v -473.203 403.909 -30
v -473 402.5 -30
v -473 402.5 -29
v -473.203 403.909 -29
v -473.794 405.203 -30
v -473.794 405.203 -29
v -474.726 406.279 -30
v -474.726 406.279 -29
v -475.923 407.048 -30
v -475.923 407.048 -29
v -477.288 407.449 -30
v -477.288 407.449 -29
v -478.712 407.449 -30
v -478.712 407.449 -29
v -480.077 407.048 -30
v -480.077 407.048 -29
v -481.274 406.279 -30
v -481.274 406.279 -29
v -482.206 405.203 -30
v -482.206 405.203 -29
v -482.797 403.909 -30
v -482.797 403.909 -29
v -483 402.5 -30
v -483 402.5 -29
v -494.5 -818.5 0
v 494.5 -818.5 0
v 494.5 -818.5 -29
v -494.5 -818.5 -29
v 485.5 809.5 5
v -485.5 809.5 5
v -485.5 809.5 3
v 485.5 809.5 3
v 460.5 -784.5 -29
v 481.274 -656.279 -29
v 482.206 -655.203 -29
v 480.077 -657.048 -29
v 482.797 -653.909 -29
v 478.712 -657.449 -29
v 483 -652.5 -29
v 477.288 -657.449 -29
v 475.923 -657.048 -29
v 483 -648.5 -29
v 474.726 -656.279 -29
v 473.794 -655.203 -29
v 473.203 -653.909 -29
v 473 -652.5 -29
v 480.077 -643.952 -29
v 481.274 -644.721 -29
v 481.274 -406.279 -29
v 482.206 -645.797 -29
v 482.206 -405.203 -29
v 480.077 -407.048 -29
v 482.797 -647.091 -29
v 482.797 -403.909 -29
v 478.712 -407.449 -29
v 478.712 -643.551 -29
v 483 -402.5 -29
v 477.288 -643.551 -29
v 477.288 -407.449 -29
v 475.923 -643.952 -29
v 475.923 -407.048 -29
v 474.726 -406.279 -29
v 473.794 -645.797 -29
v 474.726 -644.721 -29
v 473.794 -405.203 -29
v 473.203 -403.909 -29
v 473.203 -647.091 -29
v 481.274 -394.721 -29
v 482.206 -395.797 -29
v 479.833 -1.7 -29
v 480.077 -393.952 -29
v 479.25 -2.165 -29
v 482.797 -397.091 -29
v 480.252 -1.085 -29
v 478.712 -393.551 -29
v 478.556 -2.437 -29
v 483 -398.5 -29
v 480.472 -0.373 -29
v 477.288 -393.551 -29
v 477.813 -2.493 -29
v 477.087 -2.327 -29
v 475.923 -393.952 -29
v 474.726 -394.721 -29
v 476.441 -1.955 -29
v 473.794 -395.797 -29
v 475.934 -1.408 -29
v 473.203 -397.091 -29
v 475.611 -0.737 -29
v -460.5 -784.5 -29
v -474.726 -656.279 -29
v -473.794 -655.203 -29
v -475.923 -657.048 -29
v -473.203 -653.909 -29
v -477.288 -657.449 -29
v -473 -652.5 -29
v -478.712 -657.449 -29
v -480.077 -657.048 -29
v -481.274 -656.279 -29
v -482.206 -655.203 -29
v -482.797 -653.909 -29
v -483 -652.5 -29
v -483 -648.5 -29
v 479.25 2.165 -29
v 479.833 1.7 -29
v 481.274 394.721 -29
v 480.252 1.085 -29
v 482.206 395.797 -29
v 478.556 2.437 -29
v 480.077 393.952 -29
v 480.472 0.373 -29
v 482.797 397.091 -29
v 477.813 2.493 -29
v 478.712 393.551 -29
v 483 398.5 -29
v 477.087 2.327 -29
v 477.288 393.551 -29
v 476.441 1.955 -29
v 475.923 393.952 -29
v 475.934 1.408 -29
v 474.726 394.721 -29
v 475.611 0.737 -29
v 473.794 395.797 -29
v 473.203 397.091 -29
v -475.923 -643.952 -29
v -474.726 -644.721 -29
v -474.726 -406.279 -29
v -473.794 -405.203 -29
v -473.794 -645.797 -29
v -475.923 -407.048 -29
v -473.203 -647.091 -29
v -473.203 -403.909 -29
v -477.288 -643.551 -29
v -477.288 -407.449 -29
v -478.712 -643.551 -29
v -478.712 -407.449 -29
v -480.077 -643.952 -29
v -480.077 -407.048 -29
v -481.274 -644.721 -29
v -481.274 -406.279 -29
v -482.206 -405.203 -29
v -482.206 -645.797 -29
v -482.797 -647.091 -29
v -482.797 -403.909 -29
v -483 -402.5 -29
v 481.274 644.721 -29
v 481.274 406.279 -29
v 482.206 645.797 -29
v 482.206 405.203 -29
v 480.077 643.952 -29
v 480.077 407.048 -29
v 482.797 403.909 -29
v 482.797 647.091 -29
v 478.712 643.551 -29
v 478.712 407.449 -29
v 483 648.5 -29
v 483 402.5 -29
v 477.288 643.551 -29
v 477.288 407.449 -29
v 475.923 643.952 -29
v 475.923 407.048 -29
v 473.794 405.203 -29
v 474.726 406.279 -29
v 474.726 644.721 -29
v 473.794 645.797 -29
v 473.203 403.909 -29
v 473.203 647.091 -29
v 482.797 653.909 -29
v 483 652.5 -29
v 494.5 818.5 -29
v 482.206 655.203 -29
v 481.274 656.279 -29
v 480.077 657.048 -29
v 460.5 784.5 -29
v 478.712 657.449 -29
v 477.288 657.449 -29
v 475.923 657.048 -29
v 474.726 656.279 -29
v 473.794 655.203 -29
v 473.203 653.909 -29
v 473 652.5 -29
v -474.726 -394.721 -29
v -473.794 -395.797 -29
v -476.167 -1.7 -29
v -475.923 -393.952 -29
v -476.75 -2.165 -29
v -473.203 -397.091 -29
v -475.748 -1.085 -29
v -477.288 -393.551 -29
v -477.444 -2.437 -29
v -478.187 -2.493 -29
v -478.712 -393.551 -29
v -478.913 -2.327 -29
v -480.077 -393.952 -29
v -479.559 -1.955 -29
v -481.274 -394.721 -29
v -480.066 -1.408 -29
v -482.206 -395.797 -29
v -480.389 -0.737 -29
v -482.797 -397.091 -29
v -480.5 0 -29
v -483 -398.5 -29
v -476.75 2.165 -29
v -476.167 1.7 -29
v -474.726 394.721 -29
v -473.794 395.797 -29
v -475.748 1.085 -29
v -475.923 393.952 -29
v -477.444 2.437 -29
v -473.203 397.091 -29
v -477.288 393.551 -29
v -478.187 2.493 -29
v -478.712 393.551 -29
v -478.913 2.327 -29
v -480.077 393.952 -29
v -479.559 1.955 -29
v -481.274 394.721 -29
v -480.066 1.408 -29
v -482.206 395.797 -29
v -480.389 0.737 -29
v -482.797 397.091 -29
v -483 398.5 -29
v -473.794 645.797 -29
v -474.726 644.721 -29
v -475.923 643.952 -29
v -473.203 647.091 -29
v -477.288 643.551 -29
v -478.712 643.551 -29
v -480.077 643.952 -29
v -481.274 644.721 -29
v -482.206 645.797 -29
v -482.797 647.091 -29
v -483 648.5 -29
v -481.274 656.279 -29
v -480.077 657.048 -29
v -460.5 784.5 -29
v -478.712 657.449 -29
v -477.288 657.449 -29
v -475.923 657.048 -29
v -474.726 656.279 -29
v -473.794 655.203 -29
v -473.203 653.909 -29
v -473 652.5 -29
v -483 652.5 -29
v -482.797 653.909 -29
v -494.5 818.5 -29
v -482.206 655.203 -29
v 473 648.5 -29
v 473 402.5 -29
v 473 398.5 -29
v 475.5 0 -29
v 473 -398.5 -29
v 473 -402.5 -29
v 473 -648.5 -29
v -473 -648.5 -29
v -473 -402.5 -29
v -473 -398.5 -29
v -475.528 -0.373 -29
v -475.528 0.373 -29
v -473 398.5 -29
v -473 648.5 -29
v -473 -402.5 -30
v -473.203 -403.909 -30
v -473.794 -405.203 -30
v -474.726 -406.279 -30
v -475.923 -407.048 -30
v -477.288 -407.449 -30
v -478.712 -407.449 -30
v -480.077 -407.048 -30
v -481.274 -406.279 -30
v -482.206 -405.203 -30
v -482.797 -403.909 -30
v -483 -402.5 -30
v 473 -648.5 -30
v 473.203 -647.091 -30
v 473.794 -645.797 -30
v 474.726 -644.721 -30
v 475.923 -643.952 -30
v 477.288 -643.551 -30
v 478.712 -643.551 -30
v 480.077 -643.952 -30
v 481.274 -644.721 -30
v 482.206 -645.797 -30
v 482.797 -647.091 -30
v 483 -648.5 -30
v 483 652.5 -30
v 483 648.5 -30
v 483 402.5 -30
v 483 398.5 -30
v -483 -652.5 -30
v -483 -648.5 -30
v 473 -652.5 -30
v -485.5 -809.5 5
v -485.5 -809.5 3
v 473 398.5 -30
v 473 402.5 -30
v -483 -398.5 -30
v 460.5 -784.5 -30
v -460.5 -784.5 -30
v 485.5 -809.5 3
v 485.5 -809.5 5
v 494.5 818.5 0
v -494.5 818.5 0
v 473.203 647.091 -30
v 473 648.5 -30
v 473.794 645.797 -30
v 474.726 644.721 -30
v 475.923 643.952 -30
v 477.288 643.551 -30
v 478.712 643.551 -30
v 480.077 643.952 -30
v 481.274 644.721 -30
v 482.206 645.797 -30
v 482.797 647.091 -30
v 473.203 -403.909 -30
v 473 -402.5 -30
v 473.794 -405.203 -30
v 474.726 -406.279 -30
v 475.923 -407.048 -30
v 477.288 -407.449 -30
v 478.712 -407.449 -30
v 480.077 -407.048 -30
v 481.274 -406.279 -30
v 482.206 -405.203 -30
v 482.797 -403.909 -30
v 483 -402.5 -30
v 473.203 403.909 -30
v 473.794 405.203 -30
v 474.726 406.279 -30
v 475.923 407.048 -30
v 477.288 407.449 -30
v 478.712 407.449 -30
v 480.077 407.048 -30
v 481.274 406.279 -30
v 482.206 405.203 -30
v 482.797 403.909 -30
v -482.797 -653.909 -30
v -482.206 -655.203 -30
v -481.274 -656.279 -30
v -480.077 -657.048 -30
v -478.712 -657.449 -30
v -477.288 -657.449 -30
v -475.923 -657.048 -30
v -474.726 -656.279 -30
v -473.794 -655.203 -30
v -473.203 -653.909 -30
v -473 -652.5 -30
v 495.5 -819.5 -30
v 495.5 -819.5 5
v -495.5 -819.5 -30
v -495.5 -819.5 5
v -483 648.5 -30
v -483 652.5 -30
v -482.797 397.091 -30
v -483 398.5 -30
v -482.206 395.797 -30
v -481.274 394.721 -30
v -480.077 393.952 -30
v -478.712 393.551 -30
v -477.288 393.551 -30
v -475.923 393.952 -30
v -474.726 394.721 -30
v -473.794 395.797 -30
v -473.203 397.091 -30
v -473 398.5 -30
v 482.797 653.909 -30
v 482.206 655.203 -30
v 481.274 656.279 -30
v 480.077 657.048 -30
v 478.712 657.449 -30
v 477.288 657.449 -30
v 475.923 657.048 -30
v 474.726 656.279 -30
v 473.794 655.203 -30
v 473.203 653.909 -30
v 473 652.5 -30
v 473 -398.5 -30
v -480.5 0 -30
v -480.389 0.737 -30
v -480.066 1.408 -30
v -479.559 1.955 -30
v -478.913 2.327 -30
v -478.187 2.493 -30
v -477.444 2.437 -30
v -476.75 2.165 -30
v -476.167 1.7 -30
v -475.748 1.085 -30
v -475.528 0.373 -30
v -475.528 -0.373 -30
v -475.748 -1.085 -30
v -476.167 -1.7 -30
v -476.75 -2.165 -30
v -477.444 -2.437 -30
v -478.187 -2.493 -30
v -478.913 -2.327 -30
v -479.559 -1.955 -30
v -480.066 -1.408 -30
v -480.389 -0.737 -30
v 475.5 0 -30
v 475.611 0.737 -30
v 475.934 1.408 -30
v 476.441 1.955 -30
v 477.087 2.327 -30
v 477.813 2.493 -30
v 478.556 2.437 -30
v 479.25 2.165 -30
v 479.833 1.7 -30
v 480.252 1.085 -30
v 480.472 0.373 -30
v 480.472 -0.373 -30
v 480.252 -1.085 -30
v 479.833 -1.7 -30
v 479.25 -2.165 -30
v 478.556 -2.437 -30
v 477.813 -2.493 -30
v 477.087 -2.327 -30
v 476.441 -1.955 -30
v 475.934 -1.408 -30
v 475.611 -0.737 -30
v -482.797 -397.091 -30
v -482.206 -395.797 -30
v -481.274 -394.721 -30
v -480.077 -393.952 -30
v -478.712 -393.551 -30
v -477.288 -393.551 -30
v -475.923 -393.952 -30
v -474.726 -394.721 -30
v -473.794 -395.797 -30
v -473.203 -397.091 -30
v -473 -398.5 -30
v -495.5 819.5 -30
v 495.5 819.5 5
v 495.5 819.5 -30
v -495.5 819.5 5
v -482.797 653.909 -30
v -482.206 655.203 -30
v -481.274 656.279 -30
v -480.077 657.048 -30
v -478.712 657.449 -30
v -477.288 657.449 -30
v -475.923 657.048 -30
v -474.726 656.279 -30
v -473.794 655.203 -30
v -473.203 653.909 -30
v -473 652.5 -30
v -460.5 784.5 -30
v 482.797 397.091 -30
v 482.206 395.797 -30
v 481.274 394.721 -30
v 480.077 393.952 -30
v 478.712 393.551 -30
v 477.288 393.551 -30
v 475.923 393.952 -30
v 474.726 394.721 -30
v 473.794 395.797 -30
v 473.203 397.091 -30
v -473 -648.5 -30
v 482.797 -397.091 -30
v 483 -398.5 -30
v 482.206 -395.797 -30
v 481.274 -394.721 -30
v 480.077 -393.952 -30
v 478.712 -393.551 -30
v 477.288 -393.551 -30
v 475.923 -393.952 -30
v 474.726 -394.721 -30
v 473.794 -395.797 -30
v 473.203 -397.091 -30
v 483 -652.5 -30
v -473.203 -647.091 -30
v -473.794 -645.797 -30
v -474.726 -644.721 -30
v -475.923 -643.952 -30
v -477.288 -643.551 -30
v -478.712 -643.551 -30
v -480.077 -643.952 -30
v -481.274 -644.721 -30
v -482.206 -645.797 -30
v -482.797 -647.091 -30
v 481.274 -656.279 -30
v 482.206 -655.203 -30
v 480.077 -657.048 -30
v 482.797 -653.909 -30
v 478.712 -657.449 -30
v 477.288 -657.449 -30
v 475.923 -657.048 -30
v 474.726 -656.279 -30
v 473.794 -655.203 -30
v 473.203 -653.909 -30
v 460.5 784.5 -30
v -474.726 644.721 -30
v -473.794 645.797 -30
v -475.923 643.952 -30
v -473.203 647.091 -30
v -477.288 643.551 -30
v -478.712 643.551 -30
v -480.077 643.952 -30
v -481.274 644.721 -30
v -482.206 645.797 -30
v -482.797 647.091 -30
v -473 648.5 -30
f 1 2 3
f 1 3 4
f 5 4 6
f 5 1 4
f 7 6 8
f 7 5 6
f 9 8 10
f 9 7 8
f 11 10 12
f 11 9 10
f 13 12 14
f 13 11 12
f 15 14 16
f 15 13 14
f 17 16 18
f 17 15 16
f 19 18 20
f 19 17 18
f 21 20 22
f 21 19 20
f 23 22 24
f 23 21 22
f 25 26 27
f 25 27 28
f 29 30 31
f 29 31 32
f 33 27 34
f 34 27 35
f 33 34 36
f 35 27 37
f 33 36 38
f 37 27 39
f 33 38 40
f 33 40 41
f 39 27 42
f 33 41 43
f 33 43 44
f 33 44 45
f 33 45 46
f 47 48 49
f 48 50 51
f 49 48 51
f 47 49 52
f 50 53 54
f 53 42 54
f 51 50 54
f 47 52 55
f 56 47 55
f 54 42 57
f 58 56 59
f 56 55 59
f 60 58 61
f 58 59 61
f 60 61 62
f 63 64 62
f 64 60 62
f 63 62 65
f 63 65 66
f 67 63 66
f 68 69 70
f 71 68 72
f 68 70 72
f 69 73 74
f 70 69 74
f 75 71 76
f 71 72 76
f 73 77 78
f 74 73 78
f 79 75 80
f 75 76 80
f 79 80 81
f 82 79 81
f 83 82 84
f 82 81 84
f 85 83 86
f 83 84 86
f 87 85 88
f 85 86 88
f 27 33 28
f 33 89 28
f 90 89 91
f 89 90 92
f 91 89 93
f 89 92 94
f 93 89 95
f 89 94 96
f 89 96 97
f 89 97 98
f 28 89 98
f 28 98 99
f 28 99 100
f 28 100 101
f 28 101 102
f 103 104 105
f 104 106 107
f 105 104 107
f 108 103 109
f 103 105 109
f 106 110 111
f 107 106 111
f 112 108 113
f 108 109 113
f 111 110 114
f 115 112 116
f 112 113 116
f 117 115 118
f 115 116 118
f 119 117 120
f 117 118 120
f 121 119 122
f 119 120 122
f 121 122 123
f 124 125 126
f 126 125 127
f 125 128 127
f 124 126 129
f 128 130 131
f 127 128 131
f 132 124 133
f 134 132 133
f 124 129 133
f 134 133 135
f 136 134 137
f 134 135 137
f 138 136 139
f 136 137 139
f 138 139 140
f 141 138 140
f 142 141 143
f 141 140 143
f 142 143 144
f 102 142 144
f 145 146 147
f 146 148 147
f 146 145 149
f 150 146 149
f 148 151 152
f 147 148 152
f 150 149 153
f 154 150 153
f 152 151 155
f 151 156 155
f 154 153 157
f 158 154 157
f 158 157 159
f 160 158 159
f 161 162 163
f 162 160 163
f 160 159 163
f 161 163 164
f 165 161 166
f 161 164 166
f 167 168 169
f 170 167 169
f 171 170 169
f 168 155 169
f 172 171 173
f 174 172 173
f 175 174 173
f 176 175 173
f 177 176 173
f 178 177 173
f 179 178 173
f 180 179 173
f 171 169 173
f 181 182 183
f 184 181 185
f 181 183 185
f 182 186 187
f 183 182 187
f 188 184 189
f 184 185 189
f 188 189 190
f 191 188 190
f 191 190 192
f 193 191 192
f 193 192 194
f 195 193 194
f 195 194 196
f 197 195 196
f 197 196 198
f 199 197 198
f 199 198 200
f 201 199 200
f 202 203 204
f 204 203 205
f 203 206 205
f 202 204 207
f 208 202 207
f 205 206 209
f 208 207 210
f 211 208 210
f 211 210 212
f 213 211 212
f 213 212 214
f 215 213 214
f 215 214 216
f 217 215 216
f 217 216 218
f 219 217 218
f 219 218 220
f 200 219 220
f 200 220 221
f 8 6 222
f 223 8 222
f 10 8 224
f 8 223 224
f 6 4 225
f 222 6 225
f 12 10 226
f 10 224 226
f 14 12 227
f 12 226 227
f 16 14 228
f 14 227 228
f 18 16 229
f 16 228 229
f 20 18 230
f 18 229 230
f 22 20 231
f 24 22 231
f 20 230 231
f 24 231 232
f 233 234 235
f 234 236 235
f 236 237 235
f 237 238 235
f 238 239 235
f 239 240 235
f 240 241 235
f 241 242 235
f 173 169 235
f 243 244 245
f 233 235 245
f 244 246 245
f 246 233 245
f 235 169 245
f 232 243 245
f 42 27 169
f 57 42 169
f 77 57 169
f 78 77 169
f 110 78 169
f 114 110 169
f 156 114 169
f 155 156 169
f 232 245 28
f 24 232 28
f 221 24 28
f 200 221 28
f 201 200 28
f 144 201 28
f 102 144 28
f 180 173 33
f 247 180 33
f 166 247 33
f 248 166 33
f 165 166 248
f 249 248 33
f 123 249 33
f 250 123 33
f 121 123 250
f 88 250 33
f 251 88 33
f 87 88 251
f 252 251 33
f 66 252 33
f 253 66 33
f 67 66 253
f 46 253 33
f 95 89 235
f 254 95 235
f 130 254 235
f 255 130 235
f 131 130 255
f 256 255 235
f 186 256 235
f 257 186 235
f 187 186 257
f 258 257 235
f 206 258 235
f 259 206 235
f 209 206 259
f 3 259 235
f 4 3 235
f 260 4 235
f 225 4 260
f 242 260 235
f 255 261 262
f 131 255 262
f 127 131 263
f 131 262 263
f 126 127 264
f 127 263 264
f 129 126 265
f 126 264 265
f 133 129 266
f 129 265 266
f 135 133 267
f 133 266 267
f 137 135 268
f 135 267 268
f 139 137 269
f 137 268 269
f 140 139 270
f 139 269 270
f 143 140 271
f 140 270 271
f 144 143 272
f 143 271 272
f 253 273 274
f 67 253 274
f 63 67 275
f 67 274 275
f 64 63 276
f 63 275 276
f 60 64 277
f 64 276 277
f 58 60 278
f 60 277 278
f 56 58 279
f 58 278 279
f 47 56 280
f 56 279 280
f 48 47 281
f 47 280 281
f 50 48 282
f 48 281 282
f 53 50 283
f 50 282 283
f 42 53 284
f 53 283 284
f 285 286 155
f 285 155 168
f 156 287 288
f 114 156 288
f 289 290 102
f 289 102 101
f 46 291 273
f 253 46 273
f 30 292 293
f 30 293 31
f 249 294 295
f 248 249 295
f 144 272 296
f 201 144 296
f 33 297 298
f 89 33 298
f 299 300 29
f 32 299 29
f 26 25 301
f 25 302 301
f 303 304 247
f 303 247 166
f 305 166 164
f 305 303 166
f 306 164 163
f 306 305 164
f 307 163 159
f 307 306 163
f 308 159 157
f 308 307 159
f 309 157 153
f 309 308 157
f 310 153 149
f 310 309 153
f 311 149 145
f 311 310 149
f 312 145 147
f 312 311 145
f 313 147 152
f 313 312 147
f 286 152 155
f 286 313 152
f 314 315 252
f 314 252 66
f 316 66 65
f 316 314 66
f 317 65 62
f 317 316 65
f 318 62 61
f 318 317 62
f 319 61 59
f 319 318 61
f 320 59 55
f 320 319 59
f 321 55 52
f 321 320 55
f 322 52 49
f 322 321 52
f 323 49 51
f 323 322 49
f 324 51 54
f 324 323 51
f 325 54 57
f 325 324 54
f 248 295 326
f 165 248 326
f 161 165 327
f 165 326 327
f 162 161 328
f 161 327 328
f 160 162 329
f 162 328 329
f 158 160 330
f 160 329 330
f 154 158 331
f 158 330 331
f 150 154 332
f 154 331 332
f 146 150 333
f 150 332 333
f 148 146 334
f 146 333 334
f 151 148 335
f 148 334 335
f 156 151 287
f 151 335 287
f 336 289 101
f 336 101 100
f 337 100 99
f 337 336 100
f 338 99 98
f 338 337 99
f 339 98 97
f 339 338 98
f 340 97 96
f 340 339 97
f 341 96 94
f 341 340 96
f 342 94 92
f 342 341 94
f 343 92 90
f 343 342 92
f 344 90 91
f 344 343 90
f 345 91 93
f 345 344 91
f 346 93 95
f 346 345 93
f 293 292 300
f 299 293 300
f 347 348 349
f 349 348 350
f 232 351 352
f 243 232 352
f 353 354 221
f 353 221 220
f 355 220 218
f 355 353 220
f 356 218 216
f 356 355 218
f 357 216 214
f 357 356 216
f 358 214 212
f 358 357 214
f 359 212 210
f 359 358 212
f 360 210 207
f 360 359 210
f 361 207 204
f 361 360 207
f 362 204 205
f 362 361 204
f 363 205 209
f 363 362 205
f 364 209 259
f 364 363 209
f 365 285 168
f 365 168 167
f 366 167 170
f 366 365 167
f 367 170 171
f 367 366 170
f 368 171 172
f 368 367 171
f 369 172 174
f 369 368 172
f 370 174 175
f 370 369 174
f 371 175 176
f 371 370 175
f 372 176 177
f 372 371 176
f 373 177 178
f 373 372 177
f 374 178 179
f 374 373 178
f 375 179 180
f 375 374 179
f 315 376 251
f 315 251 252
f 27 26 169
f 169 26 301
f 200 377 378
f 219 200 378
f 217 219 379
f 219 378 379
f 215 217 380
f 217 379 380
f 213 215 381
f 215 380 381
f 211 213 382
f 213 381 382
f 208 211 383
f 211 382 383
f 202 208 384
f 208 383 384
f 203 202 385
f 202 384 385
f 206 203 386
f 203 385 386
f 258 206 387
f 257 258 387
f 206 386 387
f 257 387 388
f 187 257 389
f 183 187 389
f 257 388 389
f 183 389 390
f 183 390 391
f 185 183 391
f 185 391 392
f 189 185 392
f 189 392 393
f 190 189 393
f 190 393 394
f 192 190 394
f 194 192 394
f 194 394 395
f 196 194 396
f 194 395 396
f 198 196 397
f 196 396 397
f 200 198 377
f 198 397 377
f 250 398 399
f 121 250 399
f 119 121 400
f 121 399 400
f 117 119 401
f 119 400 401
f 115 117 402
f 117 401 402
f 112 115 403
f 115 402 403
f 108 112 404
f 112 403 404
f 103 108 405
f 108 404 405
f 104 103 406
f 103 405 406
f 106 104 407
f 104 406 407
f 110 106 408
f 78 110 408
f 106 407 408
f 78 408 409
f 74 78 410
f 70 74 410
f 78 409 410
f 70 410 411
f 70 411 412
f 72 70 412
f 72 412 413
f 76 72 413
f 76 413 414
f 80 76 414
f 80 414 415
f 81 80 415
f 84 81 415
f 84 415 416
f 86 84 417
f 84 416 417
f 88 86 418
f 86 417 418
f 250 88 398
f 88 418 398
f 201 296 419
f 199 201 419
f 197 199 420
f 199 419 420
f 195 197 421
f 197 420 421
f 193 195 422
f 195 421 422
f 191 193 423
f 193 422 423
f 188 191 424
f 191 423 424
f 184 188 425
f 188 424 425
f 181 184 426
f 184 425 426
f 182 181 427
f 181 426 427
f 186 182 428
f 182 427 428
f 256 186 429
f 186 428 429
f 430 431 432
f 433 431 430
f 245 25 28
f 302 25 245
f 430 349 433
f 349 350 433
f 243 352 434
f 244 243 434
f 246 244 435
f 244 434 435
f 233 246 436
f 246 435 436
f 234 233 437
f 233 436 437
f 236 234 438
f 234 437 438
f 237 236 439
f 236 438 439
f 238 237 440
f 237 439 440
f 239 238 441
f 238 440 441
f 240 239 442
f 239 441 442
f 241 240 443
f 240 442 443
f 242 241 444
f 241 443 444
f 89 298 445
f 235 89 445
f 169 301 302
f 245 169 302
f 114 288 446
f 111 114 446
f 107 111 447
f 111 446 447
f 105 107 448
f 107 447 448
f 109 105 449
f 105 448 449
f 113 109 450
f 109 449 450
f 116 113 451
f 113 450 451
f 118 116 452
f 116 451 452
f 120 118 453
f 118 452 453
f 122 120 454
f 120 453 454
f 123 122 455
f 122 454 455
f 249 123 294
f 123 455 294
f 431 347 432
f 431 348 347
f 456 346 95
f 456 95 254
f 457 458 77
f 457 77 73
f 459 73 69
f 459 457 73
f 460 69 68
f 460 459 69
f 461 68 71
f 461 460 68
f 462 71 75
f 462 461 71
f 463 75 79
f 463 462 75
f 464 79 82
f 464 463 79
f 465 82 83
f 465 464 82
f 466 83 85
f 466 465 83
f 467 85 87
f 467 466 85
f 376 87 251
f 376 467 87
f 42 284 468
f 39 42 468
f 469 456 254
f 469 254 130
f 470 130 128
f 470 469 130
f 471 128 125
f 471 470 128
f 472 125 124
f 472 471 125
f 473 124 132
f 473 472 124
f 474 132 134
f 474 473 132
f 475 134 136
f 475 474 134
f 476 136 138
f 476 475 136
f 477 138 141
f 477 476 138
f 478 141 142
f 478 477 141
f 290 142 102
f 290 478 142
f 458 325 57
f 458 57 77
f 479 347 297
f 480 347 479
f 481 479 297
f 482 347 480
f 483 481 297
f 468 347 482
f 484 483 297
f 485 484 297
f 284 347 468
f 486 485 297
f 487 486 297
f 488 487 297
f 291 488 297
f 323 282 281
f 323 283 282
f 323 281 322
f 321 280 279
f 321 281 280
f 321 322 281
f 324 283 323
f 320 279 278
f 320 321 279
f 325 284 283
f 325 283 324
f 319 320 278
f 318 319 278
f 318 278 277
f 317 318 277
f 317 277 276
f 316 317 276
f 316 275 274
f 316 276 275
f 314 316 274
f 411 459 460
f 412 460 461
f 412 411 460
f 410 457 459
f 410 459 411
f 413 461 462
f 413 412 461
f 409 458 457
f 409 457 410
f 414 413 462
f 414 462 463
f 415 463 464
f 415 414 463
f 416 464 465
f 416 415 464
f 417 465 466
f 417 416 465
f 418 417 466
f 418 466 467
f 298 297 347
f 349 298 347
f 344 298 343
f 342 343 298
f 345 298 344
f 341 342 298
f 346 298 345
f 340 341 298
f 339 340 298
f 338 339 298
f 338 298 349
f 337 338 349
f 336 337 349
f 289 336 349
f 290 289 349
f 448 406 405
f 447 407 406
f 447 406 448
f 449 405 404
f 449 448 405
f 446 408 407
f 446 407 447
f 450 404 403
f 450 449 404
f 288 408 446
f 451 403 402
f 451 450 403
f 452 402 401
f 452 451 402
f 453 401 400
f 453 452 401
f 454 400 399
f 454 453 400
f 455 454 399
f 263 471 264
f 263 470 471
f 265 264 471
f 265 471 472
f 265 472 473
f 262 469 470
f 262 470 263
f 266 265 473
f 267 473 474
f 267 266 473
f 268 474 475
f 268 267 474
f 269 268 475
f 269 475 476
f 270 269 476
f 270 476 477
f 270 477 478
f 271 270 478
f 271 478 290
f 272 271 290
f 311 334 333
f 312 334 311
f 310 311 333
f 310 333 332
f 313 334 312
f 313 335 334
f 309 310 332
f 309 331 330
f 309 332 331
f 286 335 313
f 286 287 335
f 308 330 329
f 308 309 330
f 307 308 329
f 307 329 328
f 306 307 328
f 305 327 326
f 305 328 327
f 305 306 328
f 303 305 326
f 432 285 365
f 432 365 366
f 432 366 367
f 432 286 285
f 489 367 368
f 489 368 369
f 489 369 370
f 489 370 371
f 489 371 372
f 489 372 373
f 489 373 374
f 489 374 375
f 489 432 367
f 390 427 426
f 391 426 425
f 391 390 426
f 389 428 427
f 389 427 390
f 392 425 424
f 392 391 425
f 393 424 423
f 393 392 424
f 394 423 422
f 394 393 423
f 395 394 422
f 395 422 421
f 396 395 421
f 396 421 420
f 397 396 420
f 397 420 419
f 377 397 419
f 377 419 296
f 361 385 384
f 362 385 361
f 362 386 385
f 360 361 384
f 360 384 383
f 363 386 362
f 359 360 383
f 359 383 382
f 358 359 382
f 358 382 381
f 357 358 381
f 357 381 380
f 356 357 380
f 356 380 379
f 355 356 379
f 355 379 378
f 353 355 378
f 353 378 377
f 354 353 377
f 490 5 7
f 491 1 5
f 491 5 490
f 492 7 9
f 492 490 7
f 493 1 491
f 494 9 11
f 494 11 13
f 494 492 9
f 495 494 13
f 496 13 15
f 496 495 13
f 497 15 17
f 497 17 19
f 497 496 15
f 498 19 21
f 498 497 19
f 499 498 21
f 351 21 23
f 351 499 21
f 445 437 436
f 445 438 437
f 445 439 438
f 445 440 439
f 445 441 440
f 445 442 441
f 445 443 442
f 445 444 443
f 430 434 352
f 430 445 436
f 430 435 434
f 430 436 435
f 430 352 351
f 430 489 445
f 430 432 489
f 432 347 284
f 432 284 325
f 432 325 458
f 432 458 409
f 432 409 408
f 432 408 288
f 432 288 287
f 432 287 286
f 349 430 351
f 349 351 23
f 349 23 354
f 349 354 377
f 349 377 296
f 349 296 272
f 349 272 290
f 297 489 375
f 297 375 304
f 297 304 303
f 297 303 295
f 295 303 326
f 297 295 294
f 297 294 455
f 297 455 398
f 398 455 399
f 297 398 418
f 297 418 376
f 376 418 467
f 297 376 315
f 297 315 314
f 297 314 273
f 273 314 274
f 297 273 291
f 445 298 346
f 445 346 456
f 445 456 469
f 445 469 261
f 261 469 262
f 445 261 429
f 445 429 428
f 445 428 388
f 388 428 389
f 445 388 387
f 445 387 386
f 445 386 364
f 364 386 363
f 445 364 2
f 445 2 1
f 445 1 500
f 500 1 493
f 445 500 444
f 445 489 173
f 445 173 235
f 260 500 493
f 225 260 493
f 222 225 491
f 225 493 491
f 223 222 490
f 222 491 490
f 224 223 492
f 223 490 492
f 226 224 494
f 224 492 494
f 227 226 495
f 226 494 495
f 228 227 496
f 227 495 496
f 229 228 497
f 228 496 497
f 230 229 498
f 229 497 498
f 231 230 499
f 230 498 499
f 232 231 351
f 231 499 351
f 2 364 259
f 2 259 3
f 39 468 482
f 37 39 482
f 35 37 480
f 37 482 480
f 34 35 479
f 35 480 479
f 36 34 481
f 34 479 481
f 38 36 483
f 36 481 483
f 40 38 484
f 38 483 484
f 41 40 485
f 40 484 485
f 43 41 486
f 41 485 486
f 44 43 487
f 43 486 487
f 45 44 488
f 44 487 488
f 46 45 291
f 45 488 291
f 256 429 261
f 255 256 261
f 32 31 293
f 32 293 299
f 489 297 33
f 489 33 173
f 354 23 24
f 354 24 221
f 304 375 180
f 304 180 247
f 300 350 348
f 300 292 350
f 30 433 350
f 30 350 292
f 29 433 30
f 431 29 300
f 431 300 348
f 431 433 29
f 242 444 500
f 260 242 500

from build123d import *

# Parameters (mm, degrees)
CROQUIS1_W              = 991
CROQUIS1_H              = 1639
SALIENTE_EXTRUIR1_DEPTH = 5
CROQUIS2_W              = 971
CROQUIS2_H              = 1619
CORTAR_EXTRUIR1_DEPTH   = 2
CROQUIS3_W              = 991
CROQUIS3_H              = 1639
CROQUIS3_W_2            = 989
CROQUIS3_H_2            = 1637
SALIENTE_EXTRUIR2_DEPTH = 30
CROQUIS4_W              = 991
CROQUIS4_H              = 1639
CROQUIS4_W_2            = 921
CROQUIS4_H_2            = 1569
SALIENTE_EXTRUIR3_DEPTH = 1
CROQUIS5_R              = 2.5
CORTAR_EXTRUIR2_DEPTH   = 1


with BuildPart() as part:
    # Croquis1 → Saliente-Extruir1 (new body)
    with BuildSketch(Plane.XY):
        Rectangle(CROQUIS1_W, CROQUIS1_H)
    extrude(amount=SALIENTE_EXTRUIR1_DEPTH)

    # Croquis2 → Cortar-Extruir1 (cut)
    with BuildSketch(Plane.XY.offset(5)):
        Rectangle(CROQUIS2_W, CROQUIS2_H)
    extrude(amount=-CORTAR_EXTRUIR1_DEPTH, mode=Mode.SUBTRACT)

    # Croquis3 → Saliente-Extruir2 (add)
    with BuildSketch(Plane(origin=(0, 0, 0), x_dir=(-1, 0, 0), z_dir=(0, 0, -1))):
        Rectangle(CROQUIS3_W, CROQUIS3_H)
        Rectangle(CROQUIS3_W_2, CROQUIS3_H_2, mode=Mode.SUBTRACT)
    extrude(amount=SALIENTE_EXTRUIR2_DEPTH)

    # Croquis4 → Saliente-Extruir3 (add)
    with BuildSketch(Plane(origin=(0, 0, -30), x_dir=(-1, 0, 0), z_dir=(0, 0, -1))):
        Rectangle(CROQUIS4_W, CROQUIS4_H)
        Rectangle(CROQUIS4_W_2, CROQUIS4_H_2, mode=Mode.SUBTRACT)
    extrude(amount=-SALIENTE_EXTRUIR3_DEPTH)

    # Croquis5 → Cortar-Extruir2 (cut)
    with BuildSketch(Plane(origin=(0, 0, -30), x_dir=(-1, 0, 0), z_dir=(0, 0, -1))):
        with Locations((-478, 0)):
            Circle(CROQUIS5_R)
        with Locations((478, 0)):
            Circle(CROQUIS5_R)
        with BuildLine():
            Line((-473, 652.5), (-473, 648.5))
            ThreePointArc((-473, 648.5), (-478, 643.5), (-483, 648.5))
            Line((-483, 648.5), (-483, 652.5))
            ThreePointArc((-483, 652.5), (-478, 657.5), (-473, 652.5))
        make_face()
        with BuildLine():
            Line((-473, 398.5), (-473, 402.5))
            ThreePointArc((-473, 402.5), (-478, 407.5), (-483, 402.5))
            Line((-483, 402.5), (-483, 398.5))
            ThreePointArc((-483, 398.5), (-478, 393.5), (-473, 398.5))
        make_face()
        with BuildLine():
            Line((-473, -652.5), (-473, -648.5))
            ThreePointArc((-473, -648.5), (-478, -643.5), (-483, -648.5))
            Line((-483, -648.5), (-483, -652.5))
            ThreePointArc((-483, -652.5), (-478, -657.5), (-473, -652.5))
        make_face()
        with BuildLine():
            Line((-473, -398.5), (-473, -402.5))
            ThreePointArc((-473, -402.5), (-478, -407.5), (-483, -402.5))
            Line((-483, -402.5), (-483, -398.5))
            ThreePointArc((-483, -398.5), (-478, -393.5), (-473, -398.5))
        make_face()
        with BuildLine():
            Line((473, -652.5), (473, -648.5))
            ThreePointArc((473, -648.5), (478, -643.5), (483, -648.5))
            Line((483, -648.5), (483, -652.5))
            ThreePointArc((483, -652.5), (478, -657.5), (473, -652.5))
        make_face()
        with BuildLine():
            Line((473, -398.5), (473, -402.5))
            ThreePointArc((473, -402.5), (478, -407.5), (483, -402.5))
            Line((483, -402.5), (483, -398.5))
            ThreePointArc((483, -398.5), (478, -393.5), (473, -398.5))
        make_face()
        with BuildLine():
            Line((473, 398.5), (473, 402.5))
            ThreePointArc((473, 402.5), (478, 407.5), (483, 402.5))
            Line((483, 402.5), (483, 398.5))
            ThreePointArc((483, 398.5), (478, 393.5), (473, 398.5))
        make_face()
        with BuildLine():
            Line((473, 652.5), (473, 648.5))
            ThreePointArc((473, 648.5), (478, 643.5), (483, 648.5))
            Line((483, 648.5), (483, 652.5))
            ThreePointArc((483, 652.5), (478, 657.5), (473, 652.5))
        make_face()
    extrude(amount=-CORTAR_EXTRUIR2_DEPTH, mode=Mode.SUBTRACT)


solid = part.part
